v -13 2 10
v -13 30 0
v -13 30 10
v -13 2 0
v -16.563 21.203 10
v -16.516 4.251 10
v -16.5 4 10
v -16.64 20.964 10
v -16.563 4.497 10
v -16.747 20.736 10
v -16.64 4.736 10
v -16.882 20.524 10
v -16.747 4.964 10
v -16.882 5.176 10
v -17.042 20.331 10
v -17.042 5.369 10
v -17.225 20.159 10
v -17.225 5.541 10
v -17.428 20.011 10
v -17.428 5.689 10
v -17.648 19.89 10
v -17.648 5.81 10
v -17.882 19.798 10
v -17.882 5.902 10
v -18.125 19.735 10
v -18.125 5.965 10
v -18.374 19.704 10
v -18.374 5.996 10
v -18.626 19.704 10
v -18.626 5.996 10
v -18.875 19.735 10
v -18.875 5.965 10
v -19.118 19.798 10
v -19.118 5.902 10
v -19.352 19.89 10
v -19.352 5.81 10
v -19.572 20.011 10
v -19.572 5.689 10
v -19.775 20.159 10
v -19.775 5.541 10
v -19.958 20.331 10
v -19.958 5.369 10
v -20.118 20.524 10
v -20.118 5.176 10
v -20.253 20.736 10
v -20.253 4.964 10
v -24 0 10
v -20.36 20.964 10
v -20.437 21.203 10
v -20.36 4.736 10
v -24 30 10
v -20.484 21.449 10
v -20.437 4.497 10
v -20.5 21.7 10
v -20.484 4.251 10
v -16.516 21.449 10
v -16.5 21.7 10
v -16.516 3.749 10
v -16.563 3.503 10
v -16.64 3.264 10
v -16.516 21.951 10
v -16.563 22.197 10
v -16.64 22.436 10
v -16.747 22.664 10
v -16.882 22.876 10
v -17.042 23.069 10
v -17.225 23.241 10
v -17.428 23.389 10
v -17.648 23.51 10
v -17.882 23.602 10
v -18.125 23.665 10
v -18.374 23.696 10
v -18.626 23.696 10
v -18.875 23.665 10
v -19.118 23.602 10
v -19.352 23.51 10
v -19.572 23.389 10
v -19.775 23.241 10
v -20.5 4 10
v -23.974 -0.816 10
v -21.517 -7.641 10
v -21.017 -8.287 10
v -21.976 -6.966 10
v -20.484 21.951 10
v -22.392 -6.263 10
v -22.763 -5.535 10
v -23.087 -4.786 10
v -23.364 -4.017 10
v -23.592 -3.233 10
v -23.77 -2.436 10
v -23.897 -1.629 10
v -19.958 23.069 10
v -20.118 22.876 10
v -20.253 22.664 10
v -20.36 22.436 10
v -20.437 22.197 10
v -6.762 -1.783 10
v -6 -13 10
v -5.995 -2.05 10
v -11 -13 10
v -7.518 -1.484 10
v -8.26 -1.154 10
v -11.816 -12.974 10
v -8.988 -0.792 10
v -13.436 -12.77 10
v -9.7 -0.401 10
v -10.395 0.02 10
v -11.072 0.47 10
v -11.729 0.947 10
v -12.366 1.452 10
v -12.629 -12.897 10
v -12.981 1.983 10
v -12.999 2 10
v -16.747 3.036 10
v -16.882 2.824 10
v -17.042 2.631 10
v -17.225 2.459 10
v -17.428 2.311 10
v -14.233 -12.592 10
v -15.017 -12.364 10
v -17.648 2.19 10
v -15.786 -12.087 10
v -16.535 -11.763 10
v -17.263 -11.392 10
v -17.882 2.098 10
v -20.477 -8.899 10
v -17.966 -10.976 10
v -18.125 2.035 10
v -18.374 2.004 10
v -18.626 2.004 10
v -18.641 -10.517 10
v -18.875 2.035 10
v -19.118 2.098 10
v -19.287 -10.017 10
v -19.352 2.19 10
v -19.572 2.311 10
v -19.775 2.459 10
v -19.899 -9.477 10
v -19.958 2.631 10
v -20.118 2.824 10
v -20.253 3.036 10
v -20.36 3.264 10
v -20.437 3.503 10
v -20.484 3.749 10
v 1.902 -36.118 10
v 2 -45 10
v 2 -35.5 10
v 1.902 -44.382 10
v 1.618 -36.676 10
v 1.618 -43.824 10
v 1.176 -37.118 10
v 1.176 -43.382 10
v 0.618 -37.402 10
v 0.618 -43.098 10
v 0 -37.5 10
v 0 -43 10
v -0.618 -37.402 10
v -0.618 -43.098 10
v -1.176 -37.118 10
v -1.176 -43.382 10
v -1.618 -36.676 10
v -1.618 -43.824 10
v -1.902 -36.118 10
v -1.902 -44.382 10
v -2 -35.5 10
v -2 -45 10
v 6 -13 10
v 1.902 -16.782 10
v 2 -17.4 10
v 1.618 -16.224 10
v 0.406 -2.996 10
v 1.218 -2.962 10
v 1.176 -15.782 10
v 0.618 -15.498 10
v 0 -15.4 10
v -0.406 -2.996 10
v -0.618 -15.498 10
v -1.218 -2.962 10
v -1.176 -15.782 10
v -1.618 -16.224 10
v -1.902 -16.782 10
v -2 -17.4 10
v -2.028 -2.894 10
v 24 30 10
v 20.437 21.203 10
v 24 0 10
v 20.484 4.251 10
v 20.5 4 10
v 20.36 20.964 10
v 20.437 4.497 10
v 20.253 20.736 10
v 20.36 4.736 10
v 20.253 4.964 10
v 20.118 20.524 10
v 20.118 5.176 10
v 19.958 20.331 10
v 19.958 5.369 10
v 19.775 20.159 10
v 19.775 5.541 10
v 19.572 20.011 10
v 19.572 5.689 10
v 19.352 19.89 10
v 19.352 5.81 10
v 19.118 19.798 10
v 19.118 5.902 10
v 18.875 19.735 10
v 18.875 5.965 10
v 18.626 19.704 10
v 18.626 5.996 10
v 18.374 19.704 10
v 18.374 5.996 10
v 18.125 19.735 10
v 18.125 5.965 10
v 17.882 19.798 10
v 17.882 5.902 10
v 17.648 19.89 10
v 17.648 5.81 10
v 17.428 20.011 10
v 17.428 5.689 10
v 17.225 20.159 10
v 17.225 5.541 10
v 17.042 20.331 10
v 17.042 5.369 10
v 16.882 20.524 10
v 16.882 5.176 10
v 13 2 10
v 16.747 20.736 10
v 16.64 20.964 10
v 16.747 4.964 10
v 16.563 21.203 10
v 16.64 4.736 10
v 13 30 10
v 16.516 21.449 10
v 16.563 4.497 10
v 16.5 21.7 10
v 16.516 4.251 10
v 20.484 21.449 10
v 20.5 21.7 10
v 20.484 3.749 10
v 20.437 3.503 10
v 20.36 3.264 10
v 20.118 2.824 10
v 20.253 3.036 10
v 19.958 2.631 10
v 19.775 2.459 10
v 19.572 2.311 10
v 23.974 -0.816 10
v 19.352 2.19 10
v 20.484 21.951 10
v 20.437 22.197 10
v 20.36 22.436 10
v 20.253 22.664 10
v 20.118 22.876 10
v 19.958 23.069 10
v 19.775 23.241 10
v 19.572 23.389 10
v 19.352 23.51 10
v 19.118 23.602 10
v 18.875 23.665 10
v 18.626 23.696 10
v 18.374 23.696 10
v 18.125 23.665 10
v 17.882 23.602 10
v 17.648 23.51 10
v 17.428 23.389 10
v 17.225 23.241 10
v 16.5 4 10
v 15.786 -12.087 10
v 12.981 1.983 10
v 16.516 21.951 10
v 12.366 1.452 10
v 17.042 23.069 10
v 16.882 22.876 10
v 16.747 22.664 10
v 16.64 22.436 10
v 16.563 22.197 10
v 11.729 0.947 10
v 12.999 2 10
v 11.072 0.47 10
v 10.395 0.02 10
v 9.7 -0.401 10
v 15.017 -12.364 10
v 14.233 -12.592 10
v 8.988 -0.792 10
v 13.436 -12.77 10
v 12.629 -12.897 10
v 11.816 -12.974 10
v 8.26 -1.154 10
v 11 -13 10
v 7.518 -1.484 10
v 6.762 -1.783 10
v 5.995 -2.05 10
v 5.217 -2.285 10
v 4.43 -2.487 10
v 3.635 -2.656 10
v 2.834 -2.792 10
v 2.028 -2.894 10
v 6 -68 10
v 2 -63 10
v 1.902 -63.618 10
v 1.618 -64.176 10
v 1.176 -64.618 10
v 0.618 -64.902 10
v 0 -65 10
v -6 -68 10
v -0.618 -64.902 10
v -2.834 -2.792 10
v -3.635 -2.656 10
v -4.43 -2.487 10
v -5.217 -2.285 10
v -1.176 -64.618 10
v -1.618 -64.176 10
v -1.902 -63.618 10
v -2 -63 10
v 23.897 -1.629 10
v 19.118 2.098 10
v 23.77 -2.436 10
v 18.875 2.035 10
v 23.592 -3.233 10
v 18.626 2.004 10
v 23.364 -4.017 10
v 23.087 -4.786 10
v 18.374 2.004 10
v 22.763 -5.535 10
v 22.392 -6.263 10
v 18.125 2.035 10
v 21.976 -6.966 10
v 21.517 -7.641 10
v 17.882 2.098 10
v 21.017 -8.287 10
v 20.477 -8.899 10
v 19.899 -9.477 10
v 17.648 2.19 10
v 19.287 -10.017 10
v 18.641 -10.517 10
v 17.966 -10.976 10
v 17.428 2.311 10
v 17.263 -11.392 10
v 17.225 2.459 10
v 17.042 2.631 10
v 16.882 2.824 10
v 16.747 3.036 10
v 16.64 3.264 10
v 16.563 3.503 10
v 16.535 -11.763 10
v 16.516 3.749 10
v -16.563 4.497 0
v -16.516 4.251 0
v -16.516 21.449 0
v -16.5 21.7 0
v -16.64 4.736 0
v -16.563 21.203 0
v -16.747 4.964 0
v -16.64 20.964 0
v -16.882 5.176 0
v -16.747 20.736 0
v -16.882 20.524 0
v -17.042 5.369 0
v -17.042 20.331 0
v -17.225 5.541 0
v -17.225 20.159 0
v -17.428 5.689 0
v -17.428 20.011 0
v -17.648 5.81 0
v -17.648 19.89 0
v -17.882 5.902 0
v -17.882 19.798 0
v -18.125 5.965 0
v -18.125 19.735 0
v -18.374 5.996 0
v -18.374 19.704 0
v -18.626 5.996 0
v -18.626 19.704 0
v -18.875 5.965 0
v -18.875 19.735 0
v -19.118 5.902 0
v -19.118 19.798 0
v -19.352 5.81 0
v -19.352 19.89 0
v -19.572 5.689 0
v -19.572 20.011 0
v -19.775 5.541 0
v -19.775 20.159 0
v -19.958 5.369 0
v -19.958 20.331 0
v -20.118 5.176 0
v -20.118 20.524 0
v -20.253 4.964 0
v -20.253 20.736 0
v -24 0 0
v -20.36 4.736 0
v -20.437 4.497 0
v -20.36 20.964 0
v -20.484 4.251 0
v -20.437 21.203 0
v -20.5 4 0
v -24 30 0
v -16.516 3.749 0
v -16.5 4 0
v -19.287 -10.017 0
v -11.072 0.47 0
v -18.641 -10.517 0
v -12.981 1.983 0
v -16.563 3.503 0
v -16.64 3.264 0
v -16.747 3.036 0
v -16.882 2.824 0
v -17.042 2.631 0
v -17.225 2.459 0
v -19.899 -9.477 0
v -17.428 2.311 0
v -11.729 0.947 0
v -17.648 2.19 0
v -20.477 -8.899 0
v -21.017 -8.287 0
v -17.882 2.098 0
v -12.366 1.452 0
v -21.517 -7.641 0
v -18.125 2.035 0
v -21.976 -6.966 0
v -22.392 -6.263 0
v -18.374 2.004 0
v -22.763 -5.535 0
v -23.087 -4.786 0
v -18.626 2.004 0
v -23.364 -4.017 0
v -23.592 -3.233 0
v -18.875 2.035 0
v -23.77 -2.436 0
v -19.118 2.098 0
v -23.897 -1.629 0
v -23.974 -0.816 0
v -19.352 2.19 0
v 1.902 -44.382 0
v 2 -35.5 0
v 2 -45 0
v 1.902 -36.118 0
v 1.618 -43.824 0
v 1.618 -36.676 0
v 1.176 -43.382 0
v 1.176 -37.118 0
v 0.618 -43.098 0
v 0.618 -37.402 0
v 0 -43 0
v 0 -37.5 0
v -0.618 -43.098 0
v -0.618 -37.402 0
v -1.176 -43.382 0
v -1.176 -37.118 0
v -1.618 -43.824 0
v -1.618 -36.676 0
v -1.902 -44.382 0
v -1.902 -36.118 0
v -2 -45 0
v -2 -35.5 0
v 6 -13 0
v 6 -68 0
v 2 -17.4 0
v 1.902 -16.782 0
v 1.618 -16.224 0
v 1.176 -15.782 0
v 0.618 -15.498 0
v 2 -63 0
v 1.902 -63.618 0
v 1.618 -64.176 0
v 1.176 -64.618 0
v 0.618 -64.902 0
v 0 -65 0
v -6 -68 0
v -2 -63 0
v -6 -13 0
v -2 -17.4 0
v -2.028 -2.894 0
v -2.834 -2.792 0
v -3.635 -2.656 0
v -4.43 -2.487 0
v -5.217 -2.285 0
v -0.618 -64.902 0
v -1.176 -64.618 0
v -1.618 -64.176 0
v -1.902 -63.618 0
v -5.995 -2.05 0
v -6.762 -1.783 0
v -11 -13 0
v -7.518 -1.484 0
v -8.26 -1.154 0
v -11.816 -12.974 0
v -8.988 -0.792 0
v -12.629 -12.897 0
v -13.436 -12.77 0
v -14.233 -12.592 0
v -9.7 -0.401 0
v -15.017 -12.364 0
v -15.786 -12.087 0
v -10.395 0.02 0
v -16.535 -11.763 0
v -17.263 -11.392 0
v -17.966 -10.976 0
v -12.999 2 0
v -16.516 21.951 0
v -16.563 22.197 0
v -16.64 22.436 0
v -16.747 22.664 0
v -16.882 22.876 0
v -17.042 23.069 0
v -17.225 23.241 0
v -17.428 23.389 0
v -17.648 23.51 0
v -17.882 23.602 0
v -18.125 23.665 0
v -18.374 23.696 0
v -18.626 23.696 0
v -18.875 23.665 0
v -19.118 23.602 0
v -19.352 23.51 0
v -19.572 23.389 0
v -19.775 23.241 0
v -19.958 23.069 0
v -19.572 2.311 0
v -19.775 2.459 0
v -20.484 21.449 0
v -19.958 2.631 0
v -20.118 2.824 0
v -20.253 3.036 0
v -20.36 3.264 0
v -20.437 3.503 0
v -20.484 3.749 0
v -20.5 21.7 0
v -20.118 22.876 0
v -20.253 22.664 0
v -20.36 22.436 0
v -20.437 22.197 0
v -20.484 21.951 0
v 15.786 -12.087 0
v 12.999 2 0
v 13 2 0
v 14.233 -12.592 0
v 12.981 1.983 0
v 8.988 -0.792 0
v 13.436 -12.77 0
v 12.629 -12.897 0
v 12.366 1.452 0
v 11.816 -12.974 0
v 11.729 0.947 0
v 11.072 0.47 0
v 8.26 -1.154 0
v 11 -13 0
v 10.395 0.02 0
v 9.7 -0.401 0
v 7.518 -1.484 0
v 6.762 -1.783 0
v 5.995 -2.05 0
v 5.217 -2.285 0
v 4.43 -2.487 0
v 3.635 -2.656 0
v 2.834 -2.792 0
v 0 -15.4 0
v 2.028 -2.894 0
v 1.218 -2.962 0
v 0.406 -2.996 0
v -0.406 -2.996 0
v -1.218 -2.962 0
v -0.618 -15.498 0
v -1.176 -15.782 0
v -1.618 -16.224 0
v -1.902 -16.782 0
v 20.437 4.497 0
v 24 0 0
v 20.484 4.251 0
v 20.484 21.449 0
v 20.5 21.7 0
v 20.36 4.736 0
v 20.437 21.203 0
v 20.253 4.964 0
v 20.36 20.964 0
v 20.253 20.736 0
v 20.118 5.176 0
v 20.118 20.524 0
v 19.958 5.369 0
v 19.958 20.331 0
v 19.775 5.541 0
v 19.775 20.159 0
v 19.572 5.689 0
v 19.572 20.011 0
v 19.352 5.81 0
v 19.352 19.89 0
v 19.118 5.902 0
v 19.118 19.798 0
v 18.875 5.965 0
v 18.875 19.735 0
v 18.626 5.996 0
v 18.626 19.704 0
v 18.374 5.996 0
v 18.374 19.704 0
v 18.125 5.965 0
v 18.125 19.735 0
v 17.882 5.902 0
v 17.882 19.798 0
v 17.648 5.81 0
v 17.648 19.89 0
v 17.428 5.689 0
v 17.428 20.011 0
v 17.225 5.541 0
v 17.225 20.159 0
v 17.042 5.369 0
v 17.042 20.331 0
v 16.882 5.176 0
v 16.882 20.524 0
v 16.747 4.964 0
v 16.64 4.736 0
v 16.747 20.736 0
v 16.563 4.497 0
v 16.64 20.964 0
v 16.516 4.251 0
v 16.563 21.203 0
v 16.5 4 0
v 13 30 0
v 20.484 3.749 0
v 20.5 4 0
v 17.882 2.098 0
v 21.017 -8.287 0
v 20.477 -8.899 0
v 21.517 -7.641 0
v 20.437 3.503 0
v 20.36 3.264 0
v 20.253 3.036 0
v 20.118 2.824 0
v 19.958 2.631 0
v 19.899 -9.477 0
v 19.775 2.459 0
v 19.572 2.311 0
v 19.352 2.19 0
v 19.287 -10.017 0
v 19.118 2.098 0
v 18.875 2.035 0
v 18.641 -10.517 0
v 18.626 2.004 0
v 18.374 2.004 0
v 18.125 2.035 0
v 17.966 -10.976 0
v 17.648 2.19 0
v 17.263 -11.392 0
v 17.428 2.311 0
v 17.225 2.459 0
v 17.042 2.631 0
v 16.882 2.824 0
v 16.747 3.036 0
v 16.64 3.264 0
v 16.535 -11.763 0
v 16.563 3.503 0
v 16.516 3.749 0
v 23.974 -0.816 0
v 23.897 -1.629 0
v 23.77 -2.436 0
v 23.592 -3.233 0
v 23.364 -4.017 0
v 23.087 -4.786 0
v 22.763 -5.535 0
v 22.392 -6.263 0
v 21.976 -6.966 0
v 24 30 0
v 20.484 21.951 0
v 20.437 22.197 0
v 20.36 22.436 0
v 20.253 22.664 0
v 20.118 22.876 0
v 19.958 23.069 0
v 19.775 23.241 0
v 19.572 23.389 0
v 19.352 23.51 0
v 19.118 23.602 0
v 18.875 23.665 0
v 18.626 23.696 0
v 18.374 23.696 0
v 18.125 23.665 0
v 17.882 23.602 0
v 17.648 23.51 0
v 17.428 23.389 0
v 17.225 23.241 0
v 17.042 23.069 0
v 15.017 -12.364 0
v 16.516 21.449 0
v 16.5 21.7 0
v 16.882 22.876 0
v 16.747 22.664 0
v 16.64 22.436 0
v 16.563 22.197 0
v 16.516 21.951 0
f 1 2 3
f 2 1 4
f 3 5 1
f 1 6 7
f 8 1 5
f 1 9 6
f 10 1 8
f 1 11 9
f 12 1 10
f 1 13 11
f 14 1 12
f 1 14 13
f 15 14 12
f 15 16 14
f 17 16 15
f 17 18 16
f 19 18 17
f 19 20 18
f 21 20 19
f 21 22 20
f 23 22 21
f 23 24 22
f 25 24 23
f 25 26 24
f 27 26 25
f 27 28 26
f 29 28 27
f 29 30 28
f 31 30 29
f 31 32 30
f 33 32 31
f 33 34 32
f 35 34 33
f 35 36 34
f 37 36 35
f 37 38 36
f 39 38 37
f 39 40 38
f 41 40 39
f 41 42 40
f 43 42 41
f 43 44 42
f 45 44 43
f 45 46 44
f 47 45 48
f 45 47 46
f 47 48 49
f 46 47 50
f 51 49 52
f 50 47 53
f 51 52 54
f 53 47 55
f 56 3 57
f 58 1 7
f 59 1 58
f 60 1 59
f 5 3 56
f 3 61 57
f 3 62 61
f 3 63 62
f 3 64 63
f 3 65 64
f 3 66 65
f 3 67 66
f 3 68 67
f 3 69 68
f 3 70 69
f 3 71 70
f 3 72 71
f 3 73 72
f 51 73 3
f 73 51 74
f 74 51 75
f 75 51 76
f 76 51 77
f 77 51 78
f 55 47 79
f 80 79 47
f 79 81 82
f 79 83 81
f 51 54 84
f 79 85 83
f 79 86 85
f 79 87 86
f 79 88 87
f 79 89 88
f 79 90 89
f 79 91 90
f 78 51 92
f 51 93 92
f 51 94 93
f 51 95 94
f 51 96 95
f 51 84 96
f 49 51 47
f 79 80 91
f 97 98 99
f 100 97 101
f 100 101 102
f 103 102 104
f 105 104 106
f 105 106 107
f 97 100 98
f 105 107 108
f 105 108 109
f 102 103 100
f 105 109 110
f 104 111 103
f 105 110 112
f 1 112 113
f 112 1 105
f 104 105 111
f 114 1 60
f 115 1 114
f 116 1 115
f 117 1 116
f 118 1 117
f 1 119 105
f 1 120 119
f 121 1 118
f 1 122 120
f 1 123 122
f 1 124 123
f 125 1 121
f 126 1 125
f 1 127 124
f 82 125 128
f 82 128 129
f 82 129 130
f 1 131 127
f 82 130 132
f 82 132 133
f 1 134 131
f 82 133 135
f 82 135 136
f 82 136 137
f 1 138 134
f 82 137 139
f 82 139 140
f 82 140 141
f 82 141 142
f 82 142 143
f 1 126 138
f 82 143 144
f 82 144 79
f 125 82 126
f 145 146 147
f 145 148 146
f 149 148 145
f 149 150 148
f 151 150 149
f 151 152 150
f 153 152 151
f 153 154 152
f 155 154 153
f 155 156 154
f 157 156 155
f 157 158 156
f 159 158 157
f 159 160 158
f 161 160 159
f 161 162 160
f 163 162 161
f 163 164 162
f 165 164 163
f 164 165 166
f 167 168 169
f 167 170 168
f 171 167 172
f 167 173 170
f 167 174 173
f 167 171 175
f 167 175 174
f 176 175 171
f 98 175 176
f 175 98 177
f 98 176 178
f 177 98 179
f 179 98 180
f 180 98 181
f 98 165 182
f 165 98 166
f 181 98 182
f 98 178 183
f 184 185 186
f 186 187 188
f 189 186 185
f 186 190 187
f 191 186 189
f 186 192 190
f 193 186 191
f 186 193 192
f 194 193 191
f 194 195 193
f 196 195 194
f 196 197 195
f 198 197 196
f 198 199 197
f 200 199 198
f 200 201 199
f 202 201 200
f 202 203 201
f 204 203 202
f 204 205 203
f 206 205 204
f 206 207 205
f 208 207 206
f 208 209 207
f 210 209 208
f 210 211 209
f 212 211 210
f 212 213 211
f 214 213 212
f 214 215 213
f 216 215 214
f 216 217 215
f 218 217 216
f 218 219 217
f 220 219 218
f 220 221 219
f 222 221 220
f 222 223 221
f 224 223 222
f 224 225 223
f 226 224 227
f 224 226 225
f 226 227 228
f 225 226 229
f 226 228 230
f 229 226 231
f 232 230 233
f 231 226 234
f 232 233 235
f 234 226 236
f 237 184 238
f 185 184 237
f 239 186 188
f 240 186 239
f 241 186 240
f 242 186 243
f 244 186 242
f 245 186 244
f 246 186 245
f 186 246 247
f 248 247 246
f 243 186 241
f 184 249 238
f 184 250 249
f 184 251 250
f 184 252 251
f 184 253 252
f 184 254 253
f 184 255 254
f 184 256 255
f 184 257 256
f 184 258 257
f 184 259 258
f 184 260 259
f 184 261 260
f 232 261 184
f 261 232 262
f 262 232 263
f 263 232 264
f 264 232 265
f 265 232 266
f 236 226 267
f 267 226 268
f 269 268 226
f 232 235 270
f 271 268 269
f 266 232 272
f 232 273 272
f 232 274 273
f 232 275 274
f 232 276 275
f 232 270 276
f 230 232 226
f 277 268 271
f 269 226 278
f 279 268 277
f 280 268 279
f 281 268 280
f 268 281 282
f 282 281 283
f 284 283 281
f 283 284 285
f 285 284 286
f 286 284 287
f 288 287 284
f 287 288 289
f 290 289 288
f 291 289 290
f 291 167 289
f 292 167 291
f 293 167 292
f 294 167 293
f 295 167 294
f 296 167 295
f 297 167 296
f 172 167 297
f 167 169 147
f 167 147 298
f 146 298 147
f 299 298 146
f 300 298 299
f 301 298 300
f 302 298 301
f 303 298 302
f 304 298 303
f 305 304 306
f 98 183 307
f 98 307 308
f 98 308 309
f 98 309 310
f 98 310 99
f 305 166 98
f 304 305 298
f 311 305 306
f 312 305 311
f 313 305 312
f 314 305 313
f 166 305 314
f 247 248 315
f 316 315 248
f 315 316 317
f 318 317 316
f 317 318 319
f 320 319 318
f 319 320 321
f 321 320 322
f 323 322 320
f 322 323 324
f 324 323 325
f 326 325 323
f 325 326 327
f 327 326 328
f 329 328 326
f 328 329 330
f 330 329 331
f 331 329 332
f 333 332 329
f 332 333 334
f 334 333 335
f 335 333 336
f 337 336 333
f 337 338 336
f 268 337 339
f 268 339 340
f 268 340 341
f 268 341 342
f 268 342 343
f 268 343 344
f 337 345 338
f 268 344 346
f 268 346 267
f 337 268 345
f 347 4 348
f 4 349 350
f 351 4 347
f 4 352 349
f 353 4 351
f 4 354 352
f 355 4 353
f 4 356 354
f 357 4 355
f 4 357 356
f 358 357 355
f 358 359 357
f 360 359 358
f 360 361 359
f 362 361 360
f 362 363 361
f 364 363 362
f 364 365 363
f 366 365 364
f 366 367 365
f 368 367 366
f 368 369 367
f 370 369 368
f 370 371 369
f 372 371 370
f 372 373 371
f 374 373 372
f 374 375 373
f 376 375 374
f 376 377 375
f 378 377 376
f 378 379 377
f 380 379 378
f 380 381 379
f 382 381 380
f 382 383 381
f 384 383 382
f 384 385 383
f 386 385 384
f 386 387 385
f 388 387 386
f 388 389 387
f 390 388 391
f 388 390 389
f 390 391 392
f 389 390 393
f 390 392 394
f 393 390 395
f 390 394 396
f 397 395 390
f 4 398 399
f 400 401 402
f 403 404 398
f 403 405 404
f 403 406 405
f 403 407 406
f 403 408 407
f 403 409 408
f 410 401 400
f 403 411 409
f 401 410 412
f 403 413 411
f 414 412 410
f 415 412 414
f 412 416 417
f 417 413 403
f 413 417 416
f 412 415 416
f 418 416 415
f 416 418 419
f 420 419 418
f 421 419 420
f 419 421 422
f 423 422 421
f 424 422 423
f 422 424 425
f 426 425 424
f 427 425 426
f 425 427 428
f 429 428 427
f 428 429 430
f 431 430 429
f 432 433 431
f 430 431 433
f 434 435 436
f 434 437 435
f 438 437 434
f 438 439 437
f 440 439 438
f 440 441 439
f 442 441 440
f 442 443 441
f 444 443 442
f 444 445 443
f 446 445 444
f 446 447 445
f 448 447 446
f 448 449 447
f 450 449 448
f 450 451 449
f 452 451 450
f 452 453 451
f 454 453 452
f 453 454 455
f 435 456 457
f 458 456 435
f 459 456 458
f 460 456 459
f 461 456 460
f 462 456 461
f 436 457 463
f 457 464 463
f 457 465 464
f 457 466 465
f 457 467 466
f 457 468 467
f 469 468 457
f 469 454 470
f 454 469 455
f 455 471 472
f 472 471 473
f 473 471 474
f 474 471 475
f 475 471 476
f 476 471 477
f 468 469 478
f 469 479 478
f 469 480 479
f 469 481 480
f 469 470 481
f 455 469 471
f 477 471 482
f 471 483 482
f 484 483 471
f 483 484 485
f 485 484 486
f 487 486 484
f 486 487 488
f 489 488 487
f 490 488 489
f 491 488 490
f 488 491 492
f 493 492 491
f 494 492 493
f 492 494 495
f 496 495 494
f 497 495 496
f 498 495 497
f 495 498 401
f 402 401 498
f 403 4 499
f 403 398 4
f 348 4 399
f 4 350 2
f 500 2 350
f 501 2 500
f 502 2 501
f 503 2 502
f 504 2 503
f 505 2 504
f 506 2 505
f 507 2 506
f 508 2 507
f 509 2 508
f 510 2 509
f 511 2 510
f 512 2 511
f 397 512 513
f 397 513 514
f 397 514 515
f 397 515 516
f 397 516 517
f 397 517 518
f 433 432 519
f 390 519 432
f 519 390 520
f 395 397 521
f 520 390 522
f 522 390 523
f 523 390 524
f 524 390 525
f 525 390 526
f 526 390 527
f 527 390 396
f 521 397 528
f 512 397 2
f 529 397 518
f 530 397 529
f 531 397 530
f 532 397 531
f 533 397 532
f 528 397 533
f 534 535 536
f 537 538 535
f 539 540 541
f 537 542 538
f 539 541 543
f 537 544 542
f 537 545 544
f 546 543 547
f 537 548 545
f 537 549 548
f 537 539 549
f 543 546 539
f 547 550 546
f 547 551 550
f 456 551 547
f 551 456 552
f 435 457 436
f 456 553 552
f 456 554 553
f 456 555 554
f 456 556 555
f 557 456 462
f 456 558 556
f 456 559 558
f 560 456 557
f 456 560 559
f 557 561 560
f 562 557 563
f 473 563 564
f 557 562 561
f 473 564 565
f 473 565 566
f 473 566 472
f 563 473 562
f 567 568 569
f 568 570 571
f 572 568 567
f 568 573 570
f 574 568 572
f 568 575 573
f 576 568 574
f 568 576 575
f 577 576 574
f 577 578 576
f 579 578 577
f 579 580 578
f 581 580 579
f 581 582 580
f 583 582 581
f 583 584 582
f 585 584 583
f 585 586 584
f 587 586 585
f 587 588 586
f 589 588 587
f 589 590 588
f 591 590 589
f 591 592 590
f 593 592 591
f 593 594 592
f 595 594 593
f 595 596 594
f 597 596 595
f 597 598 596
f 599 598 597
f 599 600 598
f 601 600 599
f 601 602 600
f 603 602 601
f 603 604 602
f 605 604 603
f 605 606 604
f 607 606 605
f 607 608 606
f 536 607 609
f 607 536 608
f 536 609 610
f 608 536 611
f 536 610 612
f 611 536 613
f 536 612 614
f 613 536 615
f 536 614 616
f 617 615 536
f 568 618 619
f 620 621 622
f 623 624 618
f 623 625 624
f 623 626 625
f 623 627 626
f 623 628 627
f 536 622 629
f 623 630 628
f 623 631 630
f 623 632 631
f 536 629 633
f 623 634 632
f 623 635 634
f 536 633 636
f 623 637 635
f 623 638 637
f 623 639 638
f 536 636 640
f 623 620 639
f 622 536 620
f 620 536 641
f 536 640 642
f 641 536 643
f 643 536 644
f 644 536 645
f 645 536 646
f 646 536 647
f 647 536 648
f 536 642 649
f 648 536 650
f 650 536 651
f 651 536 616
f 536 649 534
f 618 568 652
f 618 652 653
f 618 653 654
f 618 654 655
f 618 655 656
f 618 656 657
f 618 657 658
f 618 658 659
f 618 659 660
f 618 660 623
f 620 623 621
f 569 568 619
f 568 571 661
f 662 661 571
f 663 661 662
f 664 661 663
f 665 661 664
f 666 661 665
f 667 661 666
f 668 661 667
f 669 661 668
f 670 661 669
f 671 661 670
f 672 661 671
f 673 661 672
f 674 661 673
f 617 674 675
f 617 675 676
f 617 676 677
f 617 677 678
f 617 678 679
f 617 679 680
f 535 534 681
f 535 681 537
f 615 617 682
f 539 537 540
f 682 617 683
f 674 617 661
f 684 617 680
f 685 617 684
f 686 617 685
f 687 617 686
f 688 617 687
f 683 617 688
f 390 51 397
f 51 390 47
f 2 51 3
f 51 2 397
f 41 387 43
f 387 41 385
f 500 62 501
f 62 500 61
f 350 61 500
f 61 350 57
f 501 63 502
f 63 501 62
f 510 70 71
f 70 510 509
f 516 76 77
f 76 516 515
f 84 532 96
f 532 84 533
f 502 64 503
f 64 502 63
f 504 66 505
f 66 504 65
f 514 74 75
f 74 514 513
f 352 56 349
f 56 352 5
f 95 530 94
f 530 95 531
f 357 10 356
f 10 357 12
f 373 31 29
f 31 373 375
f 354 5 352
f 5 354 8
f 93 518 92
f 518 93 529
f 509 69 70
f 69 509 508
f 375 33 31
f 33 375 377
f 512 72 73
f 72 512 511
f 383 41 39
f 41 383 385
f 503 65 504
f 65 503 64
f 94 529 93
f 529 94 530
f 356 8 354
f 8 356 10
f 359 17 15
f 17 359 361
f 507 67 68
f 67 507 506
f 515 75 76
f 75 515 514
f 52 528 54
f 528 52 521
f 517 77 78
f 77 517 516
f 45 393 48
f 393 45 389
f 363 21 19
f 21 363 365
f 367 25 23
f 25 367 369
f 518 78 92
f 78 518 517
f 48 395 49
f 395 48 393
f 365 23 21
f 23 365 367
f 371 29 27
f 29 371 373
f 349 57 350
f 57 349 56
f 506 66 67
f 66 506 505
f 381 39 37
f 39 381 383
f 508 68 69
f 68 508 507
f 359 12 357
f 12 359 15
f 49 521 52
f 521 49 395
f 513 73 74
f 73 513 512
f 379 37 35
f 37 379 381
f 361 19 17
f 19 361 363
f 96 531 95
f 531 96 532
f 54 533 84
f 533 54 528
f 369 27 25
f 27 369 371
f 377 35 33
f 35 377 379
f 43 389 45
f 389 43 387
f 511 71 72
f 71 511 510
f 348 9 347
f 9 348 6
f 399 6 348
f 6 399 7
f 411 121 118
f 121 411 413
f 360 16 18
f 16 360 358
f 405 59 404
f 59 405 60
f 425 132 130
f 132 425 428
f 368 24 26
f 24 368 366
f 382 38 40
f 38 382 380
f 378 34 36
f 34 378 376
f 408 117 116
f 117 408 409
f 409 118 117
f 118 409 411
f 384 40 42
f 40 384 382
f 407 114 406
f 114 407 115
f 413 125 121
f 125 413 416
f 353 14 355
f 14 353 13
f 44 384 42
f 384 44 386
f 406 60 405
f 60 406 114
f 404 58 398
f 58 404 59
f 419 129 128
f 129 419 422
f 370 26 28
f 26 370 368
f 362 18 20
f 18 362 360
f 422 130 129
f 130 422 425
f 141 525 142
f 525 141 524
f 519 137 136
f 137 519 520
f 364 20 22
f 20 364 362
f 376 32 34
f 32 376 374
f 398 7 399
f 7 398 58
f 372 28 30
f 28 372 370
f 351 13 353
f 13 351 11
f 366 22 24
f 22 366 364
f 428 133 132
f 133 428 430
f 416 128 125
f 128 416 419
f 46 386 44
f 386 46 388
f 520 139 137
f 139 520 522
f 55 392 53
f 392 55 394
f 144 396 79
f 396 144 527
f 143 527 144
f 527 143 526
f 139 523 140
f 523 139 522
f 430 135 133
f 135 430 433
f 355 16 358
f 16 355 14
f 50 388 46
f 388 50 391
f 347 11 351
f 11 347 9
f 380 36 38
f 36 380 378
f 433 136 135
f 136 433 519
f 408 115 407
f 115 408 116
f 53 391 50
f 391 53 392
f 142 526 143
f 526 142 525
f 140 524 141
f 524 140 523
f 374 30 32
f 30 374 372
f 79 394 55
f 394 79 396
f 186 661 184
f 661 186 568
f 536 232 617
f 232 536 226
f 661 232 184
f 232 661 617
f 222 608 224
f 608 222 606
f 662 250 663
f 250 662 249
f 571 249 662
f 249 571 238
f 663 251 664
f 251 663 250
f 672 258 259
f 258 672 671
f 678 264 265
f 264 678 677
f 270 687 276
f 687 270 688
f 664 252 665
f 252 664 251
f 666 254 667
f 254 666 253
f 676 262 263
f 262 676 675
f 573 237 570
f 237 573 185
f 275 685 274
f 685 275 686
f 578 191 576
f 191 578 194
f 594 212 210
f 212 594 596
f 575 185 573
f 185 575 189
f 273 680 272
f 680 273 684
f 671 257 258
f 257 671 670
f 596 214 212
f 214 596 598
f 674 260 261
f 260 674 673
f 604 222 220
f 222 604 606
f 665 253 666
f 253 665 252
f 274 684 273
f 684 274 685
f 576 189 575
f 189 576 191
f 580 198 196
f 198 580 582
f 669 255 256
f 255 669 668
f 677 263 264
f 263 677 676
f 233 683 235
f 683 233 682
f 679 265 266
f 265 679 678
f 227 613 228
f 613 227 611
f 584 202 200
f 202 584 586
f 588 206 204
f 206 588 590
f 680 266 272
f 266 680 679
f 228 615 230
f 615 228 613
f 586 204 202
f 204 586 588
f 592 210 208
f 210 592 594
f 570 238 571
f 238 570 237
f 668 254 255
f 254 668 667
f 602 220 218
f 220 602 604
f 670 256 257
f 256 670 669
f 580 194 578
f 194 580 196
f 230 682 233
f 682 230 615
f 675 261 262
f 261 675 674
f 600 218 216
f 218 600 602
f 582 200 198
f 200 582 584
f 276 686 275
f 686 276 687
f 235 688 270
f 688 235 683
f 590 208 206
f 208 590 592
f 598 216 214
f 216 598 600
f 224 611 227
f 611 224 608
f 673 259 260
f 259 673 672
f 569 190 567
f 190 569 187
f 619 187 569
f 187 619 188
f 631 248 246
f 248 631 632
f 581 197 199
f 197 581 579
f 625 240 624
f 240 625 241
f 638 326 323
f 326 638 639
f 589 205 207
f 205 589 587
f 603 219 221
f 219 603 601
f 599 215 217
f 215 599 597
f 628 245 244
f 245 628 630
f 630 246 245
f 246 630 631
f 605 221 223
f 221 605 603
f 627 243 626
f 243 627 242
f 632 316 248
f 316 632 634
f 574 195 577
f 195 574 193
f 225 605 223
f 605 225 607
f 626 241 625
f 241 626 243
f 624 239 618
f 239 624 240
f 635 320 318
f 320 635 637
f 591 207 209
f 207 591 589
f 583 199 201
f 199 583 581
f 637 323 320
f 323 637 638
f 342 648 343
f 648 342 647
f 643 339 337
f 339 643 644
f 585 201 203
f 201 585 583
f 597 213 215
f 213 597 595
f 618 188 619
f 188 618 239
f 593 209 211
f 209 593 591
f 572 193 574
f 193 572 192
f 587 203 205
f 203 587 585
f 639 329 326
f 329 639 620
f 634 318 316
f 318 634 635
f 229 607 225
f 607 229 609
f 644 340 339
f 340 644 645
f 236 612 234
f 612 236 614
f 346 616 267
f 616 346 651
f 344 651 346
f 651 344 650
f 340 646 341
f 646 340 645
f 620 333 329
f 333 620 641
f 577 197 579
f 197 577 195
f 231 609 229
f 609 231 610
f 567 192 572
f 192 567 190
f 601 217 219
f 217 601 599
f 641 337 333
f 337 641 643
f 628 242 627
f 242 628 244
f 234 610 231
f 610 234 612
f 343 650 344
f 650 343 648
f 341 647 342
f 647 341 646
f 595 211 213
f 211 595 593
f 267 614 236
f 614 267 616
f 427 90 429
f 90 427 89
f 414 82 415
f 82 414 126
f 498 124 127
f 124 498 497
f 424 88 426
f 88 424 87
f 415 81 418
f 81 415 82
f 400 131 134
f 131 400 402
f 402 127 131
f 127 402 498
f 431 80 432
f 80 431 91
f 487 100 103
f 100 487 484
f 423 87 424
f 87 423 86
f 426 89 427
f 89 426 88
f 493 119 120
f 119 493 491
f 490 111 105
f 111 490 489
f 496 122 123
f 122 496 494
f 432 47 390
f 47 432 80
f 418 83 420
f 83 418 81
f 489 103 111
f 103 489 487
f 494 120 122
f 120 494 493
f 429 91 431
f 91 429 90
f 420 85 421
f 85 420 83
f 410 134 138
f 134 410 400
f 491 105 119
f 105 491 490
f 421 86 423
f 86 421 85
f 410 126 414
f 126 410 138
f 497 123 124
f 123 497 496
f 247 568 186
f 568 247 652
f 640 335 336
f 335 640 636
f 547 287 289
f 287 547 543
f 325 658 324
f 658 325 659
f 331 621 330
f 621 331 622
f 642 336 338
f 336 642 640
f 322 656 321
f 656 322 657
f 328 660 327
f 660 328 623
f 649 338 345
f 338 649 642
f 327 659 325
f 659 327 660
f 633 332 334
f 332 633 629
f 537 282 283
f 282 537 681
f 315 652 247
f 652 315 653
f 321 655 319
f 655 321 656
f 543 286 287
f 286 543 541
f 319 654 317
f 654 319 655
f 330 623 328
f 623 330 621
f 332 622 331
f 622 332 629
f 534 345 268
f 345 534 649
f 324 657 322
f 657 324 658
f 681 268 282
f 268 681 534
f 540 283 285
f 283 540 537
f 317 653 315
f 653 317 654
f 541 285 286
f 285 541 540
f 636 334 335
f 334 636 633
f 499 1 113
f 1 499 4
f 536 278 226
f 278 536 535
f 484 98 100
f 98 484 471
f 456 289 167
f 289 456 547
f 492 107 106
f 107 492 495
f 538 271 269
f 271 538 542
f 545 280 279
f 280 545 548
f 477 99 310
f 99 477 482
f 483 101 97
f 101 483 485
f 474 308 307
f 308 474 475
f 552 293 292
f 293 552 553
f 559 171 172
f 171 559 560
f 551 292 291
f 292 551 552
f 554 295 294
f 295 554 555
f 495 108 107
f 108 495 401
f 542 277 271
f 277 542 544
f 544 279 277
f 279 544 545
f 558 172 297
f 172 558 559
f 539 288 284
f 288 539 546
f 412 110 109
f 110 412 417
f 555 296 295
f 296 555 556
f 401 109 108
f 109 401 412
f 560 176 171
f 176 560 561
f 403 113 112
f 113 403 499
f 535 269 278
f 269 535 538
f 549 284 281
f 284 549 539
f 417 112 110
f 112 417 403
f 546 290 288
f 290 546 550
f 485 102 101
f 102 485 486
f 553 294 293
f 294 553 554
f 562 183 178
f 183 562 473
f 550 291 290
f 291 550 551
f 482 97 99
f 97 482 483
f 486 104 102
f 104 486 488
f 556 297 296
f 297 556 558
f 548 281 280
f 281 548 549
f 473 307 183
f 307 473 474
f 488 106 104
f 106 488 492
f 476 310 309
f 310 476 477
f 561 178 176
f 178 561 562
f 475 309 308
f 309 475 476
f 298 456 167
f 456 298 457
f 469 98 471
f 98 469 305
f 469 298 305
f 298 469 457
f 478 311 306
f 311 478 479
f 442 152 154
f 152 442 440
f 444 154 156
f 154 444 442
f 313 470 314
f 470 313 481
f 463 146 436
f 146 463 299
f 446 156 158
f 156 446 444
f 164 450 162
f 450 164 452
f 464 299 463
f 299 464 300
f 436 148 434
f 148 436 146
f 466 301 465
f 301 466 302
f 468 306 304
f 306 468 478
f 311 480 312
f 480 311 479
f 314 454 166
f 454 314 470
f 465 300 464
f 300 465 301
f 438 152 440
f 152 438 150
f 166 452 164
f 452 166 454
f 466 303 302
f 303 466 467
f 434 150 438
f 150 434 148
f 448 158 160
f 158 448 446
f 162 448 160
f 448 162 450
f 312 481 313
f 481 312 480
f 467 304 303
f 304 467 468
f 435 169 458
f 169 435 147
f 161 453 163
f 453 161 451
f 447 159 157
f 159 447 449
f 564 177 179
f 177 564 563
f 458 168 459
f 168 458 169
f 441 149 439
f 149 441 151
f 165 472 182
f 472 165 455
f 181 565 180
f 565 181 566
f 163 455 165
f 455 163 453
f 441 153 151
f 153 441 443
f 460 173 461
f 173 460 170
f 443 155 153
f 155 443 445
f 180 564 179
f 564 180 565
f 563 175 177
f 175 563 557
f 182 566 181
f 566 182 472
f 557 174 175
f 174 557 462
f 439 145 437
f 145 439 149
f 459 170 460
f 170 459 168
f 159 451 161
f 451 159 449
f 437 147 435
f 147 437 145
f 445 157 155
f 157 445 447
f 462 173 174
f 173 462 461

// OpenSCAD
// Ariel Burman
// Instituto de Ingeniería Biomédica
// Universidad de Buenos Aires

translate([-24,0,0])
  difference(){
    cube([11,30,10]);
    translate([5.5,21.7,-0.5])cylinder(h=11,r=2,$fn=50);
    translate([5.5,4,-0.5])cylinder(h=11,r=2,$fn=50);
  }

translate([-11+24,0,0])
  difference(){
    cube([11,30,10]);
    translate([5.5,21.7,-0.5])cylinder(h=11,r=2,$fn=50);
    translate([5.5,4,-0.5])cylinder(h=11,r=2,$fn=50);
  }
  
x0 = 13;
d1 = 5;
y0 = (x0*x0-d1*d1)/(2*d1);
R1 = y0 + d1;

difference(){
  translate([-24,-13,0])cube([48,15,10]);
  translate([0,y0+2,-0.5]) cylinder(h=11,r=R1,$fn=150);
  translate([-11,0,-0.5]) difference(){
    rotate([0,0,180])cube([13.1,13.1,11]);
    cylinder(h=11,r=13,$fn=100);
  }
  translate([11,0,-0.5]) difference(){
    rotate([0,0,-90])cube([13.1,13.1,11]);
    translate([0,0,0])cylinder(h=11,r=13,$fn=100);
  }
}

translate([-6,-55-13,0])
  difference(){
    cube([12,55,10]);
    hull(){
      translate([6,5,-0.5])cylinder(h=11,r=2,$fn=20);
      translate([6,23,-0.5])cylinder(h=11,r=2,$fn=20);
    }
    hull(){
      translate([6,32.5,-0.5])cylinder(h=11,r=2,$fn=20);
      translate([6,50.6,-0.5])cylinder(h=11,r=2,$fn=20);
    }
  }
